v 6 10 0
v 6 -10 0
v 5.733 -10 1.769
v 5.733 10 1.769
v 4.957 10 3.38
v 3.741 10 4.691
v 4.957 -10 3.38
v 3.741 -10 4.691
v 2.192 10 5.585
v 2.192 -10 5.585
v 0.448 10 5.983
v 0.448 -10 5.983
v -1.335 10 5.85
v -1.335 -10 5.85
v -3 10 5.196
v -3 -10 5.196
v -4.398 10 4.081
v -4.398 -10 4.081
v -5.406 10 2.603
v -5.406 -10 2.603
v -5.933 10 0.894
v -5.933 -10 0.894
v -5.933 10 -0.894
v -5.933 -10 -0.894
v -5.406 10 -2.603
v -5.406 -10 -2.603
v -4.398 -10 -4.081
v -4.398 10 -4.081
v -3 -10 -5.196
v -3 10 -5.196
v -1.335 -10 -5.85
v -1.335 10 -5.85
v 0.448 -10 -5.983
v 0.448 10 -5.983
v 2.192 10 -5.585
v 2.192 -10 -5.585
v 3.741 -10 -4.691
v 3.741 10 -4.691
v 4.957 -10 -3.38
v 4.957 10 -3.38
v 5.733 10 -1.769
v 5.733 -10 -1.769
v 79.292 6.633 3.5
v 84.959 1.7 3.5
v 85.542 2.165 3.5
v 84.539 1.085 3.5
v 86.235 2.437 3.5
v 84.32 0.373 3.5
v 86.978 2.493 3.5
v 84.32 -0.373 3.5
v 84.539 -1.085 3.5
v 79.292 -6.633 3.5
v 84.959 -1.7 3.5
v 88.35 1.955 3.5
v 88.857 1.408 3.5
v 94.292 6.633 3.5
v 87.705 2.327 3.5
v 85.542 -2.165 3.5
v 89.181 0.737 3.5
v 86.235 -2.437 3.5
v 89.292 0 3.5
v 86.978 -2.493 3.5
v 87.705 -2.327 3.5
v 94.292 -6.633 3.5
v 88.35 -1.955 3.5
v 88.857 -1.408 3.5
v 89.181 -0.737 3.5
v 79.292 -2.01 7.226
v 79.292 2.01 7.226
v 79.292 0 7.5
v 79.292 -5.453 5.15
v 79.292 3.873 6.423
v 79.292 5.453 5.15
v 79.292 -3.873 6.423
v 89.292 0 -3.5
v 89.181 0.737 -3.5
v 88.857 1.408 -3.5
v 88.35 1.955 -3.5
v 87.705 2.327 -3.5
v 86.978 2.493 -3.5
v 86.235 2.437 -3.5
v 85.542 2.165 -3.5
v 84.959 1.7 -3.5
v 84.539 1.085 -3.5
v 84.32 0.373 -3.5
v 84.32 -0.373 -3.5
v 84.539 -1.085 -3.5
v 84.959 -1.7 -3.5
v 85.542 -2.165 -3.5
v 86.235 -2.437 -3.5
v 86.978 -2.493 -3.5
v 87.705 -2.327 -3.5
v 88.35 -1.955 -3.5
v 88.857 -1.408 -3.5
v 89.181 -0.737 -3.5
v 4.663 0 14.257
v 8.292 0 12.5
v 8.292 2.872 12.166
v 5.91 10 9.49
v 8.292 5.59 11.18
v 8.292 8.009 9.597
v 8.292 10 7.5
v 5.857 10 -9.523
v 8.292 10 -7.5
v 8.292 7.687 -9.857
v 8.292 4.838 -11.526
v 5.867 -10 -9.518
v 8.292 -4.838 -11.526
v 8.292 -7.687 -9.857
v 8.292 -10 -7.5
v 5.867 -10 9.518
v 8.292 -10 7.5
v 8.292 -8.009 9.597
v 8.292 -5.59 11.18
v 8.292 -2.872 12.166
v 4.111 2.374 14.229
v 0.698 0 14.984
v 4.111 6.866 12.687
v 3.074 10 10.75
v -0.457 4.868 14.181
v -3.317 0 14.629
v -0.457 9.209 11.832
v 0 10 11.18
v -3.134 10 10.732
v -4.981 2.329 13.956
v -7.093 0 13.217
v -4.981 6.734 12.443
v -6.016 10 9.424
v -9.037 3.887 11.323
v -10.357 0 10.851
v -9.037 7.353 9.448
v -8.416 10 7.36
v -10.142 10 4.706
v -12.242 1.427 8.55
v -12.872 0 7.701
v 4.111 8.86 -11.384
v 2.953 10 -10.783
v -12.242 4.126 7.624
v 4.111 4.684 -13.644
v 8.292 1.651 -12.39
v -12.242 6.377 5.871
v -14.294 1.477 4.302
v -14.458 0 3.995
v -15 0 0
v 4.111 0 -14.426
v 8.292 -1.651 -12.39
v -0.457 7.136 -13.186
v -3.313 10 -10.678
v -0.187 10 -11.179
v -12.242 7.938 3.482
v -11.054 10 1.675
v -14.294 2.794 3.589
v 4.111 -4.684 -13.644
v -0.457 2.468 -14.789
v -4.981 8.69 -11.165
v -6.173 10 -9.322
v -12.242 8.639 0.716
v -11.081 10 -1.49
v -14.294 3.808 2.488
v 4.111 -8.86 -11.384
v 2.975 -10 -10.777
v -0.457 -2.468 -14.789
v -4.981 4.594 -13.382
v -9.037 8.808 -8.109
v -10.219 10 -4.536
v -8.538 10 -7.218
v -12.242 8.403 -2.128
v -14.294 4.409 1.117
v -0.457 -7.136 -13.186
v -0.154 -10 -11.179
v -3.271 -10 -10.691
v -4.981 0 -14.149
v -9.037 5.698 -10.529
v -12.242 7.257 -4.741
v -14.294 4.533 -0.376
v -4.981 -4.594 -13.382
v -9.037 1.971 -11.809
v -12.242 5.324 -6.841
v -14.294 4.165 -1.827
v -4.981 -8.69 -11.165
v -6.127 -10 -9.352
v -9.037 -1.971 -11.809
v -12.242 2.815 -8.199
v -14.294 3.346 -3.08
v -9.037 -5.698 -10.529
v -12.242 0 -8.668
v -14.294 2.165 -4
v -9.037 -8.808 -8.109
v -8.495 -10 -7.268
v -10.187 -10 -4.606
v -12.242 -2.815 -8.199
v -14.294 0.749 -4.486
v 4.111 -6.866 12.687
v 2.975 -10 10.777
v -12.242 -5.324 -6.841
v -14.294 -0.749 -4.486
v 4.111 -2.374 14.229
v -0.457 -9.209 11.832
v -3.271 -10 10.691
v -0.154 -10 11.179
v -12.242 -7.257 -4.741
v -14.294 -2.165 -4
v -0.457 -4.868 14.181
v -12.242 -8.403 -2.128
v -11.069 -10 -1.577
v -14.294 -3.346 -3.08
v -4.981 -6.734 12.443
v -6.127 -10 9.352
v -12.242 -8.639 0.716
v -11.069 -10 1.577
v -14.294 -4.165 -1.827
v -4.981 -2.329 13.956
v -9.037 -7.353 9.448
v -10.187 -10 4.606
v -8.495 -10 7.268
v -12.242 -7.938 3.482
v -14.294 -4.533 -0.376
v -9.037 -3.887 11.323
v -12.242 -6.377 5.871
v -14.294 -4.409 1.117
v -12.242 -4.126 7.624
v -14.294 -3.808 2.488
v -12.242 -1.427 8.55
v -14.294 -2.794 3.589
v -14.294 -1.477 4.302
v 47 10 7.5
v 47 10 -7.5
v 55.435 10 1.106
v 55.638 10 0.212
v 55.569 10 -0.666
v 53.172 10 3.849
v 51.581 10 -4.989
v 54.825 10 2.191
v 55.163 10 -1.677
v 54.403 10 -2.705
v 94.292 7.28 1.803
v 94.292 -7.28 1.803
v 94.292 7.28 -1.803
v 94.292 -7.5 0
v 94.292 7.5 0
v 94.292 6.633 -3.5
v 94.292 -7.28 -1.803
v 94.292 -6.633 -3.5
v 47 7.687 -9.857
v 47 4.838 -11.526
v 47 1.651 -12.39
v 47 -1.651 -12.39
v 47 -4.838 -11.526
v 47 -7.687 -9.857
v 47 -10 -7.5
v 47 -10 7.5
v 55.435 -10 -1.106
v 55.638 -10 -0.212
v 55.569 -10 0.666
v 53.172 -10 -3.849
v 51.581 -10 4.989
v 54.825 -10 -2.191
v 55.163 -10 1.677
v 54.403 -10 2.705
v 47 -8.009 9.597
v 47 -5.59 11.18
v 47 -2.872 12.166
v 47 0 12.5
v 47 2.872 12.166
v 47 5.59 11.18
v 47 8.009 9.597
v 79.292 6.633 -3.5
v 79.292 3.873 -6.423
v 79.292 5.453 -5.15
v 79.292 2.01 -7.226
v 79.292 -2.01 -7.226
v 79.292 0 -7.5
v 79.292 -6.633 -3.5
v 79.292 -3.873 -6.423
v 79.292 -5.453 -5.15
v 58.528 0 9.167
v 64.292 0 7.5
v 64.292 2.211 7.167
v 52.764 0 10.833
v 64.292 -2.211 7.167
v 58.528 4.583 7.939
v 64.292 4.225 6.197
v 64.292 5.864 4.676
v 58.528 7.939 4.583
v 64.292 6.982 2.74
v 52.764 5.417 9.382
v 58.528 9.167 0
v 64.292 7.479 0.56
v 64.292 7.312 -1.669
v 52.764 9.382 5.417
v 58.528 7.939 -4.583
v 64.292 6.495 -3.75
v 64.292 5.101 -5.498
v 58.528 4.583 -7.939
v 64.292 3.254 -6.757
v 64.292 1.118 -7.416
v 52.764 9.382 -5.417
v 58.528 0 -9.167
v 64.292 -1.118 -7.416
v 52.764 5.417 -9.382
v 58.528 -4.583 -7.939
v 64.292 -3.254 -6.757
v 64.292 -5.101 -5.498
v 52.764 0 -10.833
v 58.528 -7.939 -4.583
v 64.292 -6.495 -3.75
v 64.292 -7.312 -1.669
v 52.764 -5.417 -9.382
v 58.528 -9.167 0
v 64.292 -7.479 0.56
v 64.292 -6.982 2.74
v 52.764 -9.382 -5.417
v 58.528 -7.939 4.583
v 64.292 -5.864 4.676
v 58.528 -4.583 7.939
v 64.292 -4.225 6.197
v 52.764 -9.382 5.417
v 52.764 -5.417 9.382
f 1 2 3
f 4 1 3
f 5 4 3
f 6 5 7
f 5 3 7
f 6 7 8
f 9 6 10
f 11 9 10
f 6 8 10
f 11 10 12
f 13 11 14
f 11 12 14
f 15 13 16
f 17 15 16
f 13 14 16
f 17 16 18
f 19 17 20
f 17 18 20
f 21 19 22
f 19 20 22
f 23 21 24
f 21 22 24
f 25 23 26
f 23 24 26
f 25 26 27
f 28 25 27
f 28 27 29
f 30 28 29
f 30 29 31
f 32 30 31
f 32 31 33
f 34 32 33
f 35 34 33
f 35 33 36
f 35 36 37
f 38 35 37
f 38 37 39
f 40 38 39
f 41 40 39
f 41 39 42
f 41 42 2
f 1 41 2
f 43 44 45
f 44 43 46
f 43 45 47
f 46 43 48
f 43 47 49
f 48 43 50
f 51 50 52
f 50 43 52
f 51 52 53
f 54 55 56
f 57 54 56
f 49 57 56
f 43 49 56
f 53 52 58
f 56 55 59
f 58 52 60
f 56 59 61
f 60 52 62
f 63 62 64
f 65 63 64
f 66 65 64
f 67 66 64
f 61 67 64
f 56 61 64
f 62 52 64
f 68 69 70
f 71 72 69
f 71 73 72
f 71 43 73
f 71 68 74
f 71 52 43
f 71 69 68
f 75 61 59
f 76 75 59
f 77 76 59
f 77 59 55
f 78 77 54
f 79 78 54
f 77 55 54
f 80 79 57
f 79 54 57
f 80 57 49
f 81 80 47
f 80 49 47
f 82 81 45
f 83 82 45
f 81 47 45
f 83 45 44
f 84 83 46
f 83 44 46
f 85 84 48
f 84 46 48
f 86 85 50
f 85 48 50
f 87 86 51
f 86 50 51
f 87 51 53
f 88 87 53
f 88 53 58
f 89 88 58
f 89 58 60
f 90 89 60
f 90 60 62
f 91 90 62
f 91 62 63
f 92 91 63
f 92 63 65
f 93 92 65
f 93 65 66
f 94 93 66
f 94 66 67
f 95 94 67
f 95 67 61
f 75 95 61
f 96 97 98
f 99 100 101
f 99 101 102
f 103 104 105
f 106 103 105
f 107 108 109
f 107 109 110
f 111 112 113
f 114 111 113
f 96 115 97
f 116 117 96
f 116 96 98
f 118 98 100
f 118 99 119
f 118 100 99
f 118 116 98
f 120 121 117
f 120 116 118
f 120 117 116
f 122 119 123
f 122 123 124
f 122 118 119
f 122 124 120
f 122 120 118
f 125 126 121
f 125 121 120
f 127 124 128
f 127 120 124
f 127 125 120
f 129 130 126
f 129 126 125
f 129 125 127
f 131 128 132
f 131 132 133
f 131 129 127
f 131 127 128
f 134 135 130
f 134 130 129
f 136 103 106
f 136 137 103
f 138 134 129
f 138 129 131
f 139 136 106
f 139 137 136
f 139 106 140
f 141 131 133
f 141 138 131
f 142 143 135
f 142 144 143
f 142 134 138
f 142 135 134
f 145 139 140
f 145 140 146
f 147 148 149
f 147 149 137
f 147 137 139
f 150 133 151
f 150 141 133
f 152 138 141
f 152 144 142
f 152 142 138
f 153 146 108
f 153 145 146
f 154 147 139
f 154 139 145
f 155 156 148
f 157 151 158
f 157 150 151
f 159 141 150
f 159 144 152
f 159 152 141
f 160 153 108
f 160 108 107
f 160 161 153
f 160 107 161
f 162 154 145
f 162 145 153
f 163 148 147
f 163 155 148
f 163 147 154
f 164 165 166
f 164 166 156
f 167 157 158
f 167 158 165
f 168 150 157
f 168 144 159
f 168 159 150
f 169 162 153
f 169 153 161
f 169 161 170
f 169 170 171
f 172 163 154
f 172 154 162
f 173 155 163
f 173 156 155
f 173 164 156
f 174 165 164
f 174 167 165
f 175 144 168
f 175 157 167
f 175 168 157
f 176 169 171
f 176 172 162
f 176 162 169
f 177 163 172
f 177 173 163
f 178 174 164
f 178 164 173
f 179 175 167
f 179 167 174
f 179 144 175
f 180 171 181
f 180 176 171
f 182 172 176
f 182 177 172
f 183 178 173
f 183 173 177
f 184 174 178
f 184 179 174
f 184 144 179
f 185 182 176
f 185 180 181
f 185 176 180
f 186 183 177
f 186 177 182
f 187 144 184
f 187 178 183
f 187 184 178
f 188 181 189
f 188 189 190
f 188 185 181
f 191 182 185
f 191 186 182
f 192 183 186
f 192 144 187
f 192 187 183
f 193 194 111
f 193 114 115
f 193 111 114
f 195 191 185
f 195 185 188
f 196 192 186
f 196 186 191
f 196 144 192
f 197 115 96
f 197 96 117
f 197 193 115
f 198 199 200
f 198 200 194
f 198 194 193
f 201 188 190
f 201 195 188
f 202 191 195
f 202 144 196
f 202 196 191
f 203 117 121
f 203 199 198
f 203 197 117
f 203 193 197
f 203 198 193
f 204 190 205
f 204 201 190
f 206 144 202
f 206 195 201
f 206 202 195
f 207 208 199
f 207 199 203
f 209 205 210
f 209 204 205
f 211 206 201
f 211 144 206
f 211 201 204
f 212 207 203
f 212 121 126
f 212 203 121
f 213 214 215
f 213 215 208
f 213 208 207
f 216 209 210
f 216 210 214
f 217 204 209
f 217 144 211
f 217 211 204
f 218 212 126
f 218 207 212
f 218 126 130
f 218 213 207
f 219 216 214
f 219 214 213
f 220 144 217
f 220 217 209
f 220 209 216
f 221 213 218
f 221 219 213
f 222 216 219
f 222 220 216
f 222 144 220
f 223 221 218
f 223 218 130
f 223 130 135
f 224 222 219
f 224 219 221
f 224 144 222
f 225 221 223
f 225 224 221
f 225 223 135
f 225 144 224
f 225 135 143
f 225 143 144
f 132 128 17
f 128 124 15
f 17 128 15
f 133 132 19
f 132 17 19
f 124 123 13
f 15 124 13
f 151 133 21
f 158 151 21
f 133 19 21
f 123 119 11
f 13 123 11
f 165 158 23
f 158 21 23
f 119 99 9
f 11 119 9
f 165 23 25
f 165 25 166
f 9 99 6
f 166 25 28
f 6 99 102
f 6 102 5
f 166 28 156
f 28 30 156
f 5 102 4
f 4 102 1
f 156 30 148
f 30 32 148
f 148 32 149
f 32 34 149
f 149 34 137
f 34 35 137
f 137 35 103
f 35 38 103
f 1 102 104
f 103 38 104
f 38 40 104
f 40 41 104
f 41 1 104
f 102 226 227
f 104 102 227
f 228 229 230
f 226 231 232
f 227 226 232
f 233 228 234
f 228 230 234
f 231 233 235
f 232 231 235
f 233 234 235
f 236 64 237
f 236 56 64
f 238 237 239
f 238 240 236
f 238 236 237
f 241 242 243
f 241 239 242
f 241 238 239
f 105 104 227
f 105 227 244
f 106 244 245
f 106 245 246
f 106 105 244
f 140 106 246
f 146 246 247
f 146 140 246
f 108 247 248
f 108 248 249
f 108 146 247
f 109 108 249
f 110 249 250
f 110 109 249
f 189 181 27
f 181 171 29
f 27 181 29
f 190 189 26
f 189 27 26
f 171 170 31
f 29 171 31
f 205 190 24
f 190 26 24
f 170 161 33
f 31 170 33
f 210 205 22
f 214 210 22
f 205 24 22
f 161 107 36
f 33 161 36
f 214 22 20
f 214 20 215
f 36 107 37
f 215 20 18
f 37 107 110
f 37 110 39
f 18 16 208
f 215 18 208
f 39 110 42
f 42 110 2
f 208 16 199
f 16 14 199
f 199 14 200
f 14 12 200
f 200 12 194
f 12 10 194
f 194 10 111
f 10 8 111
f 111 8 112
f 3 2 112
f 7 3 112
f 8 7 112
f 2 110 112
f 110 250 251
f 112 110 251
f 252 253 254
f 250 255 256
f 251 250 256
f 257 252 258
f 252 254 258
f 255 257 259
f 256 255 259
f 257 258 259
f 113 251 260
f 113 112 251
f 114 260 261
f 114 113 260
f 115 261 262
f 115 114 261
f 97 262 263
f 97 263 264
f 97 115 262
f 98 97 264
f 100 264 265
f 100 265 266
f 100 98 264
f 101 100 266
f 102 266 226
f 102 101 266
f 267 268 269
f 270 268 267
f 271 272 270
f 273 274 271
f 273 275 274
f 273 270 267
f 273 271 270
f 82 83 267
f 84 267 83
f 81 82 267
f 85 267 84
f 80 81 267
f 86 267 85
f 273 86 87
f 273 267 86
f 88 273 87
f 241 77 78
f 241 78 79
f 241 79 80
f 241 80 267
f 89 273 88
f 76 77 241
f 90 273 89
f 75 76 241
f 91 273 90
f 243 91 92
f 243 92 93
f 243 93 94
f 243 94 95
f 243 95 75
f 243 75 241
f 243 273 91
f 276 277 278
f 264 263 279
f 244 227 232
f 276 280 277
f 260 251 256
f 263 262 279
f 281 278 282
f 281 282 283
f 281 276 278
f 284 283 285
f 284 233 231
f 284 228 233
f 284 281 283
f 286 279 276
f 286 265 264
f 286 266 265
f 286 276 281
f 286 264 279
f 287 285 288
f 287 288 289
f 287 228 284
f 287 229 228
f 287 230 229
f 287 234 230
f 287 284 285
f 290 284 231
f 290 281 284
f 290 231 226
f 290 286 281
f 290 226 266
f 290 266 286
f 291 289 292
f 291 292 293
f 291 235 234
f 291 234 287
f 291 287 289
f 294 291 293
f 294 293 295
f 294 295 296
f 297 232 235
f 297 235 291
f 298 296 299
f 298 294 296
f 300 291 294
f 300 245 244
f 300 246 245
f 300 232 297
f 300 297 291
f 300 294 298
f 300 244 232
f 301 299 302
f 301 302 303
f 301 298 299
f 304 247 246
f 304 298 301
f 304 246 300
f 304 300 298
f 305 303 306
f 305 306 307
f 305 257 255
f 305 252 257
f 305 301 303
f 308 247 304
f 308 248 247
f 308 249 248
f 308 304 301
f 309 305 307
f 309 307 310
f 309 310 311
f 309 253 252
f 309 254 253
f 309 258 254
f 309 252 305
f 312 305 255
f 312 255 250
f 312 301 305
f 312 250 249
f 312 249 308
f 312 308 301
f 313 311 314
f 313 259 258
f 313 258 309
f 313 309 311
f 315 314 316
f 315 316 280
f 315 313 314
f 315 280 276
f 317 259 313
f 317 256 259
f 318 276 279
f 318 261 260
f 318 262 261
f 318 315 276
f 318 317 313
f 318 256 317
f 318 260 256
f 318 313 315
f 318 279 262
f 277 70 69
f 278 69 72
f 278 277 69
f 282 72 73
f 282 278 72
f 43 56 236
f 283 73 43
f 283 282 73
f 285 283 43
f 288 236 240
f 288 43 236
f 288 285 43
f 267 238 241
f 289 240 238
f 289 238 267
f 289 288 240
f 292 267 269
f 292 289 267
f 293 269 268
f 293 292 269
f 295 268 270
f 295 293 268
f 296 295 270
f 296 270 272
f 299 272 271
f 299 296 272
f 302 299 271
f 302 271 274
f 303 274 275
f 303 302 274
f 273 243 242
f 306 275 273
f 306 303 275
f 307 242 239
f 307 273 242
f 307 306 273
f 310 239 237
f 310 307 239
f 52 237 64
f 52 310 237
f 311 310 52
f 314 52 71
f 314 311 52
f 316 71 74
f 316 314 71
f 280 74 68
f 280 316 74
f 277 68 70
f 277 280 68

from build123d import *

# Parameters (mm, degrees)
F2_W          = 15
F2_H          = 4
F3_DEPTH      = 15.001
F3_DEPTH_BACK = 15.001
F5_DEPTH      = 109.2926164658
F6_R          = 6
F7_DEPTH      = 20.001
F8_R          = 2.5
F9_DEPTH      = 18.501


with BuildPart() as f1:
    # F0 (on Front) → F1 (revolve)
    with BuildSketch(Plane.XZ):
        with BuildLine():
            ThreePointArc((8.2915619759, 12.5), (-7.0931858273, 13.2169101843), (-15, 0))
            Line((-15, 0), (94.2916164658, 0))
            Line((94.2916164658, 0), (94.2916164658, 7.5))
            Line((94.2916164658, 7.5), (64.2916164658, 7.5))
            Line((64.2916164658, 7.5), (47, 12.5))
            Line((47, 12.5), (8.2915619759, 12.5))
        make_face()
    revolve(axis=Axis((39.6458082329, 0, 0), (-1, 0, 0)))

    # F2 (on Front) → F3 (cut, two sides)
    with BuildSketch(Plane.XZ) as f3_sk:
        with Locations((86.7916164658, 5.5)):
            Rectangle(F2_W, F2_H)
        with Locations((86.7916164658, -5.5)):
            Rectangle(F2_W, F2_H)
    extrude(amount=-F3_DEPTH, mode=Mode.SUBTRACT)
    extrude(f3_sk.sketch, amount=F3_DEPTH_BACK, mode=Mode.SUBTRACT)

    # F4 (on face) → F5 (cut, through all)
    with BuildSketch(Plane.YZ.offset(94.2916164658)):
        with BuildLine():
            ThreePointArc((10, -11.1803398875), (13.6930639376, -6.123724357), (15, 0))
            ThreePointArc((15, 0), (13.6930639376, 6.123724357), (10, 11.1803398875))
            Line((10, 11.1803398875), (10, -11.1803398875))
        make_face()
        with BuildLine():
            Line((-10, -11.1803398875), (-10, 11.1803398875))
            ThreePointArc((-10, 11.1803398875), (-15, 0), (-10, -11.1803398875))
        make_face()
    extrude(amount=-F5_DEPTH, mode=Mode.SUBTRACT)

    # F6 (on face) → F7 (cut, through all)
    with BuildSketch(Plane.XZ.offset(10)):
        Circle(F6_R)
    extrude(amount=-F7_DEPTH, mode=Mode.SUBTRACT)

    # F8 (on face) → F9 (cut, through all)
    with BuildSketch(Plane.XY.offset(3.5)):
        with Locations((86.7916164658, 0)):
            Circle(F8_R)
    extrude(amount=-F9_DEPTH, mode=Mode.SUBTRACT)


solid = f1.part
